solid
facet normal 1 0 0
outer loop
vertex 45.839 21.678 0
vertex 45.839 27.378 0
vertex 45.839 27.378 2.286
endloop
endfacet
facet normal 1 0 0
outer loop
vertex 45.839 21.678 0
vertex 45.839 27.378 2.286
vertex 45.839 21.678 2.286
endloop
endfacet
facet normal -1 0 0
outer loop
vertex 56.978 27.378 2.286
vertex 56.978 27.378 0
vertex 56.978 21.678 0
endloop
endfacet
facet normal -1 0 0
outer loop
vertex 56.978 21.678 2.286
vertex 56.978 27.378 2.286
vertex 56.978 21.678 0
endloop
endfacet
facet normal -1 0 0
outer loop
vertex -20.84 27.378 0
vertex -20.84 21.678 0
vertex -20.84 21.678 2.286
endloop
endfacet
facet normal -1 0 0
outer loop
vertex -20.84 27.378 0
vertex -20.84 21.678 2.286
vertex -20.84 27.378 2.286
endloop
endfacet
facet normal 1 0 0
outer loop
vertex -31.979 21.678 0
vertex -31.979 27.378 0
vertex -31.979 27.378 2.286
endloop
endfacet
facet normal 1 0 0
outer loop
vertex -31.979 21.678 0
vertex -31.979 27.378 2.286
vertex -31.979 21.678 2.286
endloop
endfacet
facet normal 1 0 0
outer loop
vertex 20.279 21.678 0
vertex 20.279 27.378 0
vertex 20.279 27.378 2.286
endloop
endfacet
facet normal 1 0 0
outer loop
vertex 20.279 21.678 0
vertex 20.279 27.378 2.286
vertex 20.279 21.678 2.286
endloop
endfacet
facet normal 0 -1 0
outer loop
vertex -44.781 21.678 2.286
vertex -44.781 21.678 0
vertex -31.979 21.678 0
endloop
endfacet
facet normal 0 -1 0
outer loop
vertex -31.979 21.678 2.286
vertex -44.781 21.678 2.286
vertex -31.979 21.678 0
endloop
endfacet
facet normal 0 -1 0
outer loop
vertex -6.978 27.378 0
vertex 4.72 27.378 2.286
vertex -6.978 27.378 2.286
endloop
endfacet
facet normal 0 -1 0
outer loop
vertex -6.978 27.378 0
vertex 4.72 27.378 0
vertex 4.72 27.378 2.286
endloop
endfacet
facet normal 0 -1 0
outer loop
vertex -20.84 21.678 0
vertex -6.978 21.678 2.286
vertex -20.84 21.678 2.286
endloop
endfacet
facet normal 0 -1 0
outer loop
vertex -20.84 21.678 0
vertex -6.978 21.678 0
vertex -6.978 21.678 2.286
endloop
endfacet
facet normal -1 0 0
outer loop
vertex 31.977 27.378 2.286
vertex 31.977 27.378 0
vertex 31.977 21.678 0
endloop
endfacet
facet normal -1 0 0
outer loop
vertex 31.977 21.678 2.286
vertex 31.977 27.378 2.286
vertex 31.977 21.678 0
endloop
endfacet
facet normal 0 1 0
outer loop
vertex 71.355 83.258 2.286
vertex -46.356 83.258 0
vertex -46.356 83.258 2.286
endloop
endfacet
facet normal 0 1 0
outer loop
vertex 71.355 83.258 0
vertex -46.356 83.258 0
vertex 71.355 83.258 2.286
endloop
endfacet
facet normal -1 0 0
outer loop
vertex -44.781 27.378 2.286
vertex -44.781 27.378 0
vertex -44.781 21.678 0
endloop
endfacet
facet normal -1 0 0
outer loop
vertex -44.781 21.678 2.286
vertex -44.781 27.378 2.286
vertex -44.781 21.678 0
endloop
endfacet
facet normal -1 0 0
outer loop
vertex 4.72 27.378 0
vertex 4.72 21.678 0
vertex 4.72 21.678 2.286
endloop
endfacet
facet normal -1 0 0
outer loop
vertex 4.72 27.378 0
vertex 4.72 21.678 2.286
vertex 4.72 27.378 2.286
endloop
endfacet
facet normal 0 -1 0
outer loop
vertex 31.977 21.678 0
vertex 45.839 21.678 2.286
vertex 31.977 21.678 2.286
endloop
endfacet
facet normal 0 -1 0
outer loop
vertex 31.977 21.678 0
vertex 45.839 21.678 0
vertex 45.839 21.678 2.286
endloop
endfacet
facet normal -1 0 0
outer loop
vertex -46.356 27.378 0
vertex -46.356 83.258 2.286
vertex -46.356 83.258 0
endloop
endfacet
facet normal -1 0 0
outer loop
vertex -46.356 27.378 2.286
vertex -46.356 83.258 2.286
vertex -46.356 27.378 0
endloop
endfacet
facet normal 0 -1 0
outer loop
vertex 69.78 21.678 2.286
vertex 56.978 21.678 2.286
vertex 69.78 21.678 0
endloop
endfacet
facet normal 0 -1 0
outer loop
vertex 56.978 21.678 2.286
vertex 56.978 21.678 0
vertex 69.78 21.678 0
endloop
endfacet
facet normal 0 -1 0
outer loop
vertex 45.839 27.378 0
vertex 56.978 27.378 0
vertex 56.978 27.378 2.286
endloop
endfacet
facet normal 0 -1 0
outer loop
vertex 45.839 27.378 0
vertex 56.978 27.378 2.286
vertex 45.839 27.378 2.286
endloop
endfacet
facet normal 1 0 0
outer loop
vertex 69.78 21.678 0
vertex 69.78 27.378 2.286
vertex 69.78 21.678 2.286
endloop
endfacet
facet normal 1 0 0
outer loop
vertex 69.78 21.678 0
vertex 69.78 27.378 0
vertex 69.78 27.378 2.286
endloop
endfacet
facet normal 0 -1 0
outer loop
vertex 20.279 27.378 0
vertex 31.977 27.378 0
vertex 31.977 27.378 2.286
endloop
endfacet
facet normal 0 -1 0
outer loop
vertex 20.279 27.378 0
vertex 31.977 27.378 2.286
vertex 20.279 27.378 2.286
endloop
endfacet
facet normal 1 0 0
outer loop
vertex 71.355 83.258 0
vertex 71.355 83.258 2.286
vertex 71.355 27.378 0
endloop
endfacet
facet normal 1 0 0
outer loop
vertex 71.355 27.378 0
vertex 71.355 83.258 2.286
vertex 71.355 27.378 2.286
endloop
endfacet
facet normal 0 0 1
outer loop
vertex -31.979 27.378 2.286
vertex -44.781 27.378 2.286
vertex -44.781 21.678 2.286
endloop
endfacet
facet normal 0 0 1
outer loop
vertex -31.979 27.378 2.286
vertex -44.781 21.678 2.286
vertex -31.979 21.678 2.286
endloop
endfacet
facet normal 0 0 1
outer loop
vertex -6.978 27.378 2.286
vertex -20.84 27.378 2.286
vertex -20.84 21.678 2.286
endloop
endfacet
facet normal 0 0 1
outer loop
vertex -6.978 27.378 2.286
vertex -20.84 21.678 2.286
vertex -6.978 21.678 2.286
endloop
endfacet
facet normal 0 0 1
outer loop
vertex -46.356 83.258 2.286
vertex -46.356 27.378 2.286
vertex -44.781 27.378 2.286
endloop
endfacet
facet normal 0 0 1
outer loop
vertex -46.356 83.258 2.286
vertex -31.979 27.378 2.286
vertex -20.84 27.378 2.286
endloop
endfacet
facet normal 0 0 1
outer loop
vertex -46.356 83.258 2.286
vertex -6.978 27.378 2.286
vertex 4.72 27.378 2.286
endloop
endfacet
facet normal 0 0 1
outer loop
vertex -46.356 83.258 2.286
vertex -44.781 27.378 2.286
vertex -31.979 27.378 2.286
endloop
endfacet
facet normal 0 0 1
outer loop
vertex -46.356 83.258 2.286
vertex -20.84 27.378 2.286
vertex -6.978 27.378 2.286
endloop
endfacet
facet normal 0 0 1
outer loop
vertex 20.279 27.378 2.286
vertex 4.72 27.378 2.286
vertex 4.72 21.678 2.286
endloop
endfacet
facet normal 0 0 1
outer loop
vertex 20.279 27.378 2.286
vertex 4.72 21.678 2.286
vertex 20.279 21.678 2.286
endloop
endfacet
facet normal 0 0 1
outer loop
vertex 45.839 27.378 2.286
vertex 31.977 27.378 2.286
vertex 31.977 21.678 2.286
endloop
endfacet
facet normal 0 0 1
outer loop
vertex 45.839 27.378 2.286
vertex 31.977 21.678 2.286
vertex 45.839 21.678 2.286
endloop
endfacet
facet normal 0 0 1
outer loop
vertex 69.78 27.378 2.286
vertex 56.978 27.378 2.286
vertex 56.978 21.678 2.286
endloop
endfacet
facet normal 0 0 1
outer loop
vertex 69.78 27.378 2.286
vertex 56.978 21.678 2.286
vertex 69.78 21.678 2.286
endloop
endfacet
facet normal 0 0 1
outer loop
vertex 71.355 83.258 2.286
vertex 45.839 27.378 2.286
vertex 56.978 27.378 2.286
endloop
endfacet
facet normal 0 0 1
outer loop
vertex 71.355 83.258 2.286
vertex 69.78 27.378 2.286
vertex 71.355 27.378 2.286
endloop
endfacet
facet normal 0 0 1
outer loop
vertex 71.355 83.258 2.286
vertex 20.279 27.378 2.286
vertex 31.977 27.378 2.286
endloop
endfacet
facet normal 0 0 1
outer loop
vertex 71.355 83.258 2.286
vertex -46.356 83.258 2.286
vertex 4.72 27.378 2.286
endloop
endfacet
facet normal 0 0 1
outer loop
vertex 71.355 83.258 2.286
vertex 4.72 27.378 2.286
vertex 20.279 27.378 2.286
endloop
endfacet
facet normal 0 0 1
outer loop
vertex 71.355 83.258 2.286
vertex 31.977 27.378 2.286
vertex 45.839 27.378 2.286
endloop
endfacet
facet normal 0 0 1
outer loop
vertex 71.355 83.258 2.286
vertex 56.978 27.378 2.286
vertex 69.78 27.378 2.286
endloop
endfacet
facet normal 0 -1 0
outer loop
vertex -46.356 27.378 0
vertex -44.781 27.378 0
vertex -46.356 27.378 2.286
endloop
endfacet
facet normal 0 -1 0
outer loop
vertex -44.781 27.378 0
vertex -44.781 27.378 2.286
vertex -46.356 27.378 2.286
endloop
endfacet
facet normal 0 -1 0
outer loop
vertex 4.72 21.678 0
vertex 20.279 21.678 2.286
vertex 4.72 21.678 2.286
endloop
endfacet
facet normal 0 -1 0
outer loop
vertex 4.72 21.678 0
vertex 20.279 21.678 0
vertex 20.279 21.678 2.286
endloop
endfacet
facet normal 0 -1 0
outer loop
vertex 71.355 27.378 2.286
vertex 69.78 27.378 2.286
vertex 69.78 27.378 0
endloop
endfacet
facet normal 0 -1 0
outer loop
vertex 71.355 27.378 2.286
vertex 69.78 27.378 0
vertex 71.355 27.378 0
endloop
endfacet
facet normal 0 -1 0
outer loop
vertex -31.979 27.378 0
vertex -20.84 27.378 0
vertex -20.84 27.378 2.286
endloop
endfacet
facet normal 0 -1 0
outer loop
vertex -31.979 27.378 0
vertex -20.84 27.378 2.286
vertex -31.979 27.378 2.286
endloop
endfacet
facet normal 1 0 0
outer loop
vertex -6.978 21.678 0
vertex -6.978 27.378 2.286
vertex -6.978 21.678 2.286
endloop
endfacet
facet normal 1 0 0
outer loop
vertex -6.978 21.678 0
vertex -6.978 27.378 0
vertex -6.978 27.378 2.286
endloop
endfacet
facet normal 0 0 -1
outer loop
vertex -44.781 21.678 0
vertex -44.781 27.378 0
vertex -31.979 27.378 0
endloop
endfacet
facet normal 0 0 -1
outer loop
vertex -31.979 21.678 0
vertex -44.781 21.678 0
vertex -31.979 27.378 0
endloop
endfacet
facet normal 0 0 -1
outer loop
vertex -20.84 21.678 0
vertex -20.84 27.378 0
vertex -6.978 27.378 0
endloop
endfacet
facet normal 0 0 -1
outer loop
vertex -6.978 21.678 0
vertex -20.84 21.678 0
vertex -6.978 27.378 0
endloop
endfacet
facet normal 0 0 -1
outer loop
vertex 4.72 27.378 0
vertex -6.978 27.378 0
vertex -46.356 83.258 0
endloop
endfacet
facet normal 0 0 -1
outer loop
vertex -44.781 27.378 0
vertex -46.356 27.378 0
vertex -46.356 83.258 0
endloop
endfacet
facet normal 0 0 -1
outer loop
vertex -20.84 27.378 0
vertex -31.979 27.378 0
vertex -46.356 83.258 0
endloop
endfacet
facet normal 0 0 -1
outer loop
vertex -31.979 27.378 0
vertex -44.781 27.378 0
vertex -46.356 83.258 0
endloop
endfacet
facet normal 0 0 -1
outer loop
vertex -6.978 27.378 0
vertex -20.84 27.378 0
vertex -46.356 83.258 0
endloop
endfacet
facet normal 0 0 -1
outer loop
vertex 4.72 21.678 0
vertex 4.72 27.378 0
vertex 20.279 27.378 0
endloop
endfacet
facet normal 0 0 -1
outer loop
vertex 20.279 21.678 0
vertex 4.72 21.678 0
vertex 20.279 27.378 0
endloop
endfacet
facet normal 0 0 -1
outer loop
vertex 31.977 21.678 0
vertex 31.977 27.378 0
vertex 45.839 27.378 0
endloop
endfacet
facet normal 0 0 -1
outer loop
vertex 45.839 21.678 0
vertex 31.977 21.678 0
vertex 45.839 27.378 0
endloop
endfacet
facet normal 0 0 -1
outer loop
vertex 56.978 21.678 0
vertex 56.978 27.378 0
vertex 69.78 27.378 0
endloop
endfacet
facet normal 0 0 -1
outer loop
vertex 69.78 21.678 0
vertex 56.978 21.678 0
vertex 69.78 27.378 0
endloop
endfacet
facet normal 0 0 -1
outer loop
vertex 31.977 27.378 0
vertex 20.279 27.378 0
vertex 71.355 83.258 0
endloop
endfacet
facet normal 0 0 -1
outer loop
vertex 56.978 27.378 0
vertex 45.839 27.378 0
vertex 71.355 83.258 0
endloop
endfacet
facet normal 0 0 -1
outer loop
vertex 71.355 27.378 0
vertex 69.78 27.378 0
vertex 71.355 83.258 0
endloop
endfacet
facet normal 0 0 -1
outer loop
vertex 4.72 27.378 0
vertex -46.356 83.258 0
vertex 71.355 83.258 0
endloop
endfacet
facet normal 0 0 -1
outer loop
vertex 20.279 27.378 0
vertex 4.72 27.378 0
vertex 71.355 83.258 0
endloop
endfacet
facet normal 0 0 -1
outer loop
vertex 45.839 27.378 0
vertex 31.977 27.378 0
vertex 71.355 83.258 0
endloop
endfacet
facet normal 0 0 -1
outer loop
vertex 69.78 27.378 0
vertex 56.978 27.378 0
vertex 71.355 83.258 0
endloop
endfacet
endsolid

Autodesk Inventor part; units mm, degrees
ref_plane "YZ Plane" through (0, 0, 0) normal (1, 0, 0) x (0, 1, 0)
ref_plane "XZ Plane" through (0, 0, 0) normal (0, 1, 0) x (-1, 0, 0)
ref_plane "XY Plane" through (0, 0, 0) normal (0, 0, 1) x (1, 0, 0)
sketch "Sketch1" plane through (0, 0, 0) normal (0, 0, 1) x (1, 0, 0)
  line L0 (-44.7811, 27.3777) -> (-44.7811, 21.678)
  line L1 (69.7802, 27.3777) -> (69.7802, 21.678)
  line L2 (69.7802, 27.3777) -> (69.7802, 21.678)
  line L3 (-44.7811, 21.678) -> (-31.9793, 21.678)
  line L4 (-31.9793, 27.3777) -> (-31.9793, 21.678)
  line L5 (-31.9793, 27.3777) -> (-31.9793, 21.678)
  line L6 (-20.8402, 21.678) -> (-20.8402, 27.3777)
  line L7 (-20.8402, 27.3777) -> (-20.8402, 21.678)
  line L8 (4.7205, 21.678) -> (4.7205, 27.3777)
  line L9 (4.7205, 27.3777) -> (4.7205, 21.678)
  line L10 (20.2786, 27.3777) -> (20.2786, 21.678)
  line L11 (20.2786, 27.3777) -> (20.2786, 21.678)
  line L12 (31.9768, 27.3777) -> (31.9768, 21.678)
  line L13 (45.8394, 27.3777) -> (45.8394, 21.678)
  line L14 (45.8394, 27.3777) -> (45.8394, 21.678)
  line L15 (56.9784, 21.678) -> (69.7802, 21.678)
  line L16 (56.9784, 27.3777) -> (56.9784, 21.678)
  line L17 (-6.9776, 27.3777) -> (-6.9776, 21.678)
  line L18 (-31.9793, 21.678) -> (-44.7811, 21.678)
  line L19 (-6.9776, 21.678) -> (-20.8402, 21.678)
  line L20 (20.2786, 21.678) -> (4.7205, 21.678)
  line L21 (69.7802, 21.678) -> (56.9784, 21.678)
  line L22 (45.8394, 21.678) -> (31.9768, 21.678)
  line L23 (-44.7811, 27.3777) -> (-44.7811, 83.2577)
  line L24 (-44.7811, 83.2577) -> (69.7802, 83.2577)
  line L25 (69.7802, 83.2577) -> (69.7802, 27.3777)
  line L26 (56.9784, 27.3777) -> (45.8394, 27.3777)
  line L27 (31.9768, 27.3777) -> (20.2786, 27.3777)
  line L28 (4.7205, 27.3777) -> (-6.9776, 27.3777)
  line L29 (-20.8402, 27.3777) -> (-31.9793, 27.3777)
  point P0 (0, 0)
  dimension "d0" = 55.88
extrude "Extrusion1" add sketch "Sketch1" along normal blind 2.286
sketch "Sketch2" plane through (0, 0, 2.286) normal (0, 0, 1) x (1, 0, 0)
  line L0 (-31.9793, 21.678) -> (-31.9793, 27.3777) projected
  line L1 (-44.7811, 83.2577) -> (-44.7811, 21.678) projected
  line L2 (-44.7811, 27.3777) -> (-46.3559, 27.3777)
  line L3 (-44.7811, 83.2577) -> (-46.3559, 83.2577)
  line L4 (-46.3559, 83.2577) -> (-46.3559, 27.3777)
  line L5 (69.7802, 83.2577) -> (-44.7811, 83.2577) projected
  line L6 (69.7802, 27.3777) -> (71.355, 27.3777)
  line L7 (71.355, 83.2577) -> (71.355, 27.3777)
  line L8 (-44.7811, 83.2577) -> (-44.7811, 27.3777)
  line L9 (69.7802, 83.2577) -> (71.355, 83.2577)
  line L10 (69.7802, 21.678) -> (69.7802, 83.2577) projected
  line L11 (69.7802, 83.2577) -> (69.7802, 27.3777)
  point P0 (0, 0)
  dimension "d3" = 1.5748
extrude "Extrusion2" add sketch "Sketch2" against normal blind 2.286
sketch "Sketch3" plane through (0, 0, 2.286) normal (0, 0, 1) x (1, 0, 0)
  point P0 (0, 0)
properties part number "mcdave_ramp"
